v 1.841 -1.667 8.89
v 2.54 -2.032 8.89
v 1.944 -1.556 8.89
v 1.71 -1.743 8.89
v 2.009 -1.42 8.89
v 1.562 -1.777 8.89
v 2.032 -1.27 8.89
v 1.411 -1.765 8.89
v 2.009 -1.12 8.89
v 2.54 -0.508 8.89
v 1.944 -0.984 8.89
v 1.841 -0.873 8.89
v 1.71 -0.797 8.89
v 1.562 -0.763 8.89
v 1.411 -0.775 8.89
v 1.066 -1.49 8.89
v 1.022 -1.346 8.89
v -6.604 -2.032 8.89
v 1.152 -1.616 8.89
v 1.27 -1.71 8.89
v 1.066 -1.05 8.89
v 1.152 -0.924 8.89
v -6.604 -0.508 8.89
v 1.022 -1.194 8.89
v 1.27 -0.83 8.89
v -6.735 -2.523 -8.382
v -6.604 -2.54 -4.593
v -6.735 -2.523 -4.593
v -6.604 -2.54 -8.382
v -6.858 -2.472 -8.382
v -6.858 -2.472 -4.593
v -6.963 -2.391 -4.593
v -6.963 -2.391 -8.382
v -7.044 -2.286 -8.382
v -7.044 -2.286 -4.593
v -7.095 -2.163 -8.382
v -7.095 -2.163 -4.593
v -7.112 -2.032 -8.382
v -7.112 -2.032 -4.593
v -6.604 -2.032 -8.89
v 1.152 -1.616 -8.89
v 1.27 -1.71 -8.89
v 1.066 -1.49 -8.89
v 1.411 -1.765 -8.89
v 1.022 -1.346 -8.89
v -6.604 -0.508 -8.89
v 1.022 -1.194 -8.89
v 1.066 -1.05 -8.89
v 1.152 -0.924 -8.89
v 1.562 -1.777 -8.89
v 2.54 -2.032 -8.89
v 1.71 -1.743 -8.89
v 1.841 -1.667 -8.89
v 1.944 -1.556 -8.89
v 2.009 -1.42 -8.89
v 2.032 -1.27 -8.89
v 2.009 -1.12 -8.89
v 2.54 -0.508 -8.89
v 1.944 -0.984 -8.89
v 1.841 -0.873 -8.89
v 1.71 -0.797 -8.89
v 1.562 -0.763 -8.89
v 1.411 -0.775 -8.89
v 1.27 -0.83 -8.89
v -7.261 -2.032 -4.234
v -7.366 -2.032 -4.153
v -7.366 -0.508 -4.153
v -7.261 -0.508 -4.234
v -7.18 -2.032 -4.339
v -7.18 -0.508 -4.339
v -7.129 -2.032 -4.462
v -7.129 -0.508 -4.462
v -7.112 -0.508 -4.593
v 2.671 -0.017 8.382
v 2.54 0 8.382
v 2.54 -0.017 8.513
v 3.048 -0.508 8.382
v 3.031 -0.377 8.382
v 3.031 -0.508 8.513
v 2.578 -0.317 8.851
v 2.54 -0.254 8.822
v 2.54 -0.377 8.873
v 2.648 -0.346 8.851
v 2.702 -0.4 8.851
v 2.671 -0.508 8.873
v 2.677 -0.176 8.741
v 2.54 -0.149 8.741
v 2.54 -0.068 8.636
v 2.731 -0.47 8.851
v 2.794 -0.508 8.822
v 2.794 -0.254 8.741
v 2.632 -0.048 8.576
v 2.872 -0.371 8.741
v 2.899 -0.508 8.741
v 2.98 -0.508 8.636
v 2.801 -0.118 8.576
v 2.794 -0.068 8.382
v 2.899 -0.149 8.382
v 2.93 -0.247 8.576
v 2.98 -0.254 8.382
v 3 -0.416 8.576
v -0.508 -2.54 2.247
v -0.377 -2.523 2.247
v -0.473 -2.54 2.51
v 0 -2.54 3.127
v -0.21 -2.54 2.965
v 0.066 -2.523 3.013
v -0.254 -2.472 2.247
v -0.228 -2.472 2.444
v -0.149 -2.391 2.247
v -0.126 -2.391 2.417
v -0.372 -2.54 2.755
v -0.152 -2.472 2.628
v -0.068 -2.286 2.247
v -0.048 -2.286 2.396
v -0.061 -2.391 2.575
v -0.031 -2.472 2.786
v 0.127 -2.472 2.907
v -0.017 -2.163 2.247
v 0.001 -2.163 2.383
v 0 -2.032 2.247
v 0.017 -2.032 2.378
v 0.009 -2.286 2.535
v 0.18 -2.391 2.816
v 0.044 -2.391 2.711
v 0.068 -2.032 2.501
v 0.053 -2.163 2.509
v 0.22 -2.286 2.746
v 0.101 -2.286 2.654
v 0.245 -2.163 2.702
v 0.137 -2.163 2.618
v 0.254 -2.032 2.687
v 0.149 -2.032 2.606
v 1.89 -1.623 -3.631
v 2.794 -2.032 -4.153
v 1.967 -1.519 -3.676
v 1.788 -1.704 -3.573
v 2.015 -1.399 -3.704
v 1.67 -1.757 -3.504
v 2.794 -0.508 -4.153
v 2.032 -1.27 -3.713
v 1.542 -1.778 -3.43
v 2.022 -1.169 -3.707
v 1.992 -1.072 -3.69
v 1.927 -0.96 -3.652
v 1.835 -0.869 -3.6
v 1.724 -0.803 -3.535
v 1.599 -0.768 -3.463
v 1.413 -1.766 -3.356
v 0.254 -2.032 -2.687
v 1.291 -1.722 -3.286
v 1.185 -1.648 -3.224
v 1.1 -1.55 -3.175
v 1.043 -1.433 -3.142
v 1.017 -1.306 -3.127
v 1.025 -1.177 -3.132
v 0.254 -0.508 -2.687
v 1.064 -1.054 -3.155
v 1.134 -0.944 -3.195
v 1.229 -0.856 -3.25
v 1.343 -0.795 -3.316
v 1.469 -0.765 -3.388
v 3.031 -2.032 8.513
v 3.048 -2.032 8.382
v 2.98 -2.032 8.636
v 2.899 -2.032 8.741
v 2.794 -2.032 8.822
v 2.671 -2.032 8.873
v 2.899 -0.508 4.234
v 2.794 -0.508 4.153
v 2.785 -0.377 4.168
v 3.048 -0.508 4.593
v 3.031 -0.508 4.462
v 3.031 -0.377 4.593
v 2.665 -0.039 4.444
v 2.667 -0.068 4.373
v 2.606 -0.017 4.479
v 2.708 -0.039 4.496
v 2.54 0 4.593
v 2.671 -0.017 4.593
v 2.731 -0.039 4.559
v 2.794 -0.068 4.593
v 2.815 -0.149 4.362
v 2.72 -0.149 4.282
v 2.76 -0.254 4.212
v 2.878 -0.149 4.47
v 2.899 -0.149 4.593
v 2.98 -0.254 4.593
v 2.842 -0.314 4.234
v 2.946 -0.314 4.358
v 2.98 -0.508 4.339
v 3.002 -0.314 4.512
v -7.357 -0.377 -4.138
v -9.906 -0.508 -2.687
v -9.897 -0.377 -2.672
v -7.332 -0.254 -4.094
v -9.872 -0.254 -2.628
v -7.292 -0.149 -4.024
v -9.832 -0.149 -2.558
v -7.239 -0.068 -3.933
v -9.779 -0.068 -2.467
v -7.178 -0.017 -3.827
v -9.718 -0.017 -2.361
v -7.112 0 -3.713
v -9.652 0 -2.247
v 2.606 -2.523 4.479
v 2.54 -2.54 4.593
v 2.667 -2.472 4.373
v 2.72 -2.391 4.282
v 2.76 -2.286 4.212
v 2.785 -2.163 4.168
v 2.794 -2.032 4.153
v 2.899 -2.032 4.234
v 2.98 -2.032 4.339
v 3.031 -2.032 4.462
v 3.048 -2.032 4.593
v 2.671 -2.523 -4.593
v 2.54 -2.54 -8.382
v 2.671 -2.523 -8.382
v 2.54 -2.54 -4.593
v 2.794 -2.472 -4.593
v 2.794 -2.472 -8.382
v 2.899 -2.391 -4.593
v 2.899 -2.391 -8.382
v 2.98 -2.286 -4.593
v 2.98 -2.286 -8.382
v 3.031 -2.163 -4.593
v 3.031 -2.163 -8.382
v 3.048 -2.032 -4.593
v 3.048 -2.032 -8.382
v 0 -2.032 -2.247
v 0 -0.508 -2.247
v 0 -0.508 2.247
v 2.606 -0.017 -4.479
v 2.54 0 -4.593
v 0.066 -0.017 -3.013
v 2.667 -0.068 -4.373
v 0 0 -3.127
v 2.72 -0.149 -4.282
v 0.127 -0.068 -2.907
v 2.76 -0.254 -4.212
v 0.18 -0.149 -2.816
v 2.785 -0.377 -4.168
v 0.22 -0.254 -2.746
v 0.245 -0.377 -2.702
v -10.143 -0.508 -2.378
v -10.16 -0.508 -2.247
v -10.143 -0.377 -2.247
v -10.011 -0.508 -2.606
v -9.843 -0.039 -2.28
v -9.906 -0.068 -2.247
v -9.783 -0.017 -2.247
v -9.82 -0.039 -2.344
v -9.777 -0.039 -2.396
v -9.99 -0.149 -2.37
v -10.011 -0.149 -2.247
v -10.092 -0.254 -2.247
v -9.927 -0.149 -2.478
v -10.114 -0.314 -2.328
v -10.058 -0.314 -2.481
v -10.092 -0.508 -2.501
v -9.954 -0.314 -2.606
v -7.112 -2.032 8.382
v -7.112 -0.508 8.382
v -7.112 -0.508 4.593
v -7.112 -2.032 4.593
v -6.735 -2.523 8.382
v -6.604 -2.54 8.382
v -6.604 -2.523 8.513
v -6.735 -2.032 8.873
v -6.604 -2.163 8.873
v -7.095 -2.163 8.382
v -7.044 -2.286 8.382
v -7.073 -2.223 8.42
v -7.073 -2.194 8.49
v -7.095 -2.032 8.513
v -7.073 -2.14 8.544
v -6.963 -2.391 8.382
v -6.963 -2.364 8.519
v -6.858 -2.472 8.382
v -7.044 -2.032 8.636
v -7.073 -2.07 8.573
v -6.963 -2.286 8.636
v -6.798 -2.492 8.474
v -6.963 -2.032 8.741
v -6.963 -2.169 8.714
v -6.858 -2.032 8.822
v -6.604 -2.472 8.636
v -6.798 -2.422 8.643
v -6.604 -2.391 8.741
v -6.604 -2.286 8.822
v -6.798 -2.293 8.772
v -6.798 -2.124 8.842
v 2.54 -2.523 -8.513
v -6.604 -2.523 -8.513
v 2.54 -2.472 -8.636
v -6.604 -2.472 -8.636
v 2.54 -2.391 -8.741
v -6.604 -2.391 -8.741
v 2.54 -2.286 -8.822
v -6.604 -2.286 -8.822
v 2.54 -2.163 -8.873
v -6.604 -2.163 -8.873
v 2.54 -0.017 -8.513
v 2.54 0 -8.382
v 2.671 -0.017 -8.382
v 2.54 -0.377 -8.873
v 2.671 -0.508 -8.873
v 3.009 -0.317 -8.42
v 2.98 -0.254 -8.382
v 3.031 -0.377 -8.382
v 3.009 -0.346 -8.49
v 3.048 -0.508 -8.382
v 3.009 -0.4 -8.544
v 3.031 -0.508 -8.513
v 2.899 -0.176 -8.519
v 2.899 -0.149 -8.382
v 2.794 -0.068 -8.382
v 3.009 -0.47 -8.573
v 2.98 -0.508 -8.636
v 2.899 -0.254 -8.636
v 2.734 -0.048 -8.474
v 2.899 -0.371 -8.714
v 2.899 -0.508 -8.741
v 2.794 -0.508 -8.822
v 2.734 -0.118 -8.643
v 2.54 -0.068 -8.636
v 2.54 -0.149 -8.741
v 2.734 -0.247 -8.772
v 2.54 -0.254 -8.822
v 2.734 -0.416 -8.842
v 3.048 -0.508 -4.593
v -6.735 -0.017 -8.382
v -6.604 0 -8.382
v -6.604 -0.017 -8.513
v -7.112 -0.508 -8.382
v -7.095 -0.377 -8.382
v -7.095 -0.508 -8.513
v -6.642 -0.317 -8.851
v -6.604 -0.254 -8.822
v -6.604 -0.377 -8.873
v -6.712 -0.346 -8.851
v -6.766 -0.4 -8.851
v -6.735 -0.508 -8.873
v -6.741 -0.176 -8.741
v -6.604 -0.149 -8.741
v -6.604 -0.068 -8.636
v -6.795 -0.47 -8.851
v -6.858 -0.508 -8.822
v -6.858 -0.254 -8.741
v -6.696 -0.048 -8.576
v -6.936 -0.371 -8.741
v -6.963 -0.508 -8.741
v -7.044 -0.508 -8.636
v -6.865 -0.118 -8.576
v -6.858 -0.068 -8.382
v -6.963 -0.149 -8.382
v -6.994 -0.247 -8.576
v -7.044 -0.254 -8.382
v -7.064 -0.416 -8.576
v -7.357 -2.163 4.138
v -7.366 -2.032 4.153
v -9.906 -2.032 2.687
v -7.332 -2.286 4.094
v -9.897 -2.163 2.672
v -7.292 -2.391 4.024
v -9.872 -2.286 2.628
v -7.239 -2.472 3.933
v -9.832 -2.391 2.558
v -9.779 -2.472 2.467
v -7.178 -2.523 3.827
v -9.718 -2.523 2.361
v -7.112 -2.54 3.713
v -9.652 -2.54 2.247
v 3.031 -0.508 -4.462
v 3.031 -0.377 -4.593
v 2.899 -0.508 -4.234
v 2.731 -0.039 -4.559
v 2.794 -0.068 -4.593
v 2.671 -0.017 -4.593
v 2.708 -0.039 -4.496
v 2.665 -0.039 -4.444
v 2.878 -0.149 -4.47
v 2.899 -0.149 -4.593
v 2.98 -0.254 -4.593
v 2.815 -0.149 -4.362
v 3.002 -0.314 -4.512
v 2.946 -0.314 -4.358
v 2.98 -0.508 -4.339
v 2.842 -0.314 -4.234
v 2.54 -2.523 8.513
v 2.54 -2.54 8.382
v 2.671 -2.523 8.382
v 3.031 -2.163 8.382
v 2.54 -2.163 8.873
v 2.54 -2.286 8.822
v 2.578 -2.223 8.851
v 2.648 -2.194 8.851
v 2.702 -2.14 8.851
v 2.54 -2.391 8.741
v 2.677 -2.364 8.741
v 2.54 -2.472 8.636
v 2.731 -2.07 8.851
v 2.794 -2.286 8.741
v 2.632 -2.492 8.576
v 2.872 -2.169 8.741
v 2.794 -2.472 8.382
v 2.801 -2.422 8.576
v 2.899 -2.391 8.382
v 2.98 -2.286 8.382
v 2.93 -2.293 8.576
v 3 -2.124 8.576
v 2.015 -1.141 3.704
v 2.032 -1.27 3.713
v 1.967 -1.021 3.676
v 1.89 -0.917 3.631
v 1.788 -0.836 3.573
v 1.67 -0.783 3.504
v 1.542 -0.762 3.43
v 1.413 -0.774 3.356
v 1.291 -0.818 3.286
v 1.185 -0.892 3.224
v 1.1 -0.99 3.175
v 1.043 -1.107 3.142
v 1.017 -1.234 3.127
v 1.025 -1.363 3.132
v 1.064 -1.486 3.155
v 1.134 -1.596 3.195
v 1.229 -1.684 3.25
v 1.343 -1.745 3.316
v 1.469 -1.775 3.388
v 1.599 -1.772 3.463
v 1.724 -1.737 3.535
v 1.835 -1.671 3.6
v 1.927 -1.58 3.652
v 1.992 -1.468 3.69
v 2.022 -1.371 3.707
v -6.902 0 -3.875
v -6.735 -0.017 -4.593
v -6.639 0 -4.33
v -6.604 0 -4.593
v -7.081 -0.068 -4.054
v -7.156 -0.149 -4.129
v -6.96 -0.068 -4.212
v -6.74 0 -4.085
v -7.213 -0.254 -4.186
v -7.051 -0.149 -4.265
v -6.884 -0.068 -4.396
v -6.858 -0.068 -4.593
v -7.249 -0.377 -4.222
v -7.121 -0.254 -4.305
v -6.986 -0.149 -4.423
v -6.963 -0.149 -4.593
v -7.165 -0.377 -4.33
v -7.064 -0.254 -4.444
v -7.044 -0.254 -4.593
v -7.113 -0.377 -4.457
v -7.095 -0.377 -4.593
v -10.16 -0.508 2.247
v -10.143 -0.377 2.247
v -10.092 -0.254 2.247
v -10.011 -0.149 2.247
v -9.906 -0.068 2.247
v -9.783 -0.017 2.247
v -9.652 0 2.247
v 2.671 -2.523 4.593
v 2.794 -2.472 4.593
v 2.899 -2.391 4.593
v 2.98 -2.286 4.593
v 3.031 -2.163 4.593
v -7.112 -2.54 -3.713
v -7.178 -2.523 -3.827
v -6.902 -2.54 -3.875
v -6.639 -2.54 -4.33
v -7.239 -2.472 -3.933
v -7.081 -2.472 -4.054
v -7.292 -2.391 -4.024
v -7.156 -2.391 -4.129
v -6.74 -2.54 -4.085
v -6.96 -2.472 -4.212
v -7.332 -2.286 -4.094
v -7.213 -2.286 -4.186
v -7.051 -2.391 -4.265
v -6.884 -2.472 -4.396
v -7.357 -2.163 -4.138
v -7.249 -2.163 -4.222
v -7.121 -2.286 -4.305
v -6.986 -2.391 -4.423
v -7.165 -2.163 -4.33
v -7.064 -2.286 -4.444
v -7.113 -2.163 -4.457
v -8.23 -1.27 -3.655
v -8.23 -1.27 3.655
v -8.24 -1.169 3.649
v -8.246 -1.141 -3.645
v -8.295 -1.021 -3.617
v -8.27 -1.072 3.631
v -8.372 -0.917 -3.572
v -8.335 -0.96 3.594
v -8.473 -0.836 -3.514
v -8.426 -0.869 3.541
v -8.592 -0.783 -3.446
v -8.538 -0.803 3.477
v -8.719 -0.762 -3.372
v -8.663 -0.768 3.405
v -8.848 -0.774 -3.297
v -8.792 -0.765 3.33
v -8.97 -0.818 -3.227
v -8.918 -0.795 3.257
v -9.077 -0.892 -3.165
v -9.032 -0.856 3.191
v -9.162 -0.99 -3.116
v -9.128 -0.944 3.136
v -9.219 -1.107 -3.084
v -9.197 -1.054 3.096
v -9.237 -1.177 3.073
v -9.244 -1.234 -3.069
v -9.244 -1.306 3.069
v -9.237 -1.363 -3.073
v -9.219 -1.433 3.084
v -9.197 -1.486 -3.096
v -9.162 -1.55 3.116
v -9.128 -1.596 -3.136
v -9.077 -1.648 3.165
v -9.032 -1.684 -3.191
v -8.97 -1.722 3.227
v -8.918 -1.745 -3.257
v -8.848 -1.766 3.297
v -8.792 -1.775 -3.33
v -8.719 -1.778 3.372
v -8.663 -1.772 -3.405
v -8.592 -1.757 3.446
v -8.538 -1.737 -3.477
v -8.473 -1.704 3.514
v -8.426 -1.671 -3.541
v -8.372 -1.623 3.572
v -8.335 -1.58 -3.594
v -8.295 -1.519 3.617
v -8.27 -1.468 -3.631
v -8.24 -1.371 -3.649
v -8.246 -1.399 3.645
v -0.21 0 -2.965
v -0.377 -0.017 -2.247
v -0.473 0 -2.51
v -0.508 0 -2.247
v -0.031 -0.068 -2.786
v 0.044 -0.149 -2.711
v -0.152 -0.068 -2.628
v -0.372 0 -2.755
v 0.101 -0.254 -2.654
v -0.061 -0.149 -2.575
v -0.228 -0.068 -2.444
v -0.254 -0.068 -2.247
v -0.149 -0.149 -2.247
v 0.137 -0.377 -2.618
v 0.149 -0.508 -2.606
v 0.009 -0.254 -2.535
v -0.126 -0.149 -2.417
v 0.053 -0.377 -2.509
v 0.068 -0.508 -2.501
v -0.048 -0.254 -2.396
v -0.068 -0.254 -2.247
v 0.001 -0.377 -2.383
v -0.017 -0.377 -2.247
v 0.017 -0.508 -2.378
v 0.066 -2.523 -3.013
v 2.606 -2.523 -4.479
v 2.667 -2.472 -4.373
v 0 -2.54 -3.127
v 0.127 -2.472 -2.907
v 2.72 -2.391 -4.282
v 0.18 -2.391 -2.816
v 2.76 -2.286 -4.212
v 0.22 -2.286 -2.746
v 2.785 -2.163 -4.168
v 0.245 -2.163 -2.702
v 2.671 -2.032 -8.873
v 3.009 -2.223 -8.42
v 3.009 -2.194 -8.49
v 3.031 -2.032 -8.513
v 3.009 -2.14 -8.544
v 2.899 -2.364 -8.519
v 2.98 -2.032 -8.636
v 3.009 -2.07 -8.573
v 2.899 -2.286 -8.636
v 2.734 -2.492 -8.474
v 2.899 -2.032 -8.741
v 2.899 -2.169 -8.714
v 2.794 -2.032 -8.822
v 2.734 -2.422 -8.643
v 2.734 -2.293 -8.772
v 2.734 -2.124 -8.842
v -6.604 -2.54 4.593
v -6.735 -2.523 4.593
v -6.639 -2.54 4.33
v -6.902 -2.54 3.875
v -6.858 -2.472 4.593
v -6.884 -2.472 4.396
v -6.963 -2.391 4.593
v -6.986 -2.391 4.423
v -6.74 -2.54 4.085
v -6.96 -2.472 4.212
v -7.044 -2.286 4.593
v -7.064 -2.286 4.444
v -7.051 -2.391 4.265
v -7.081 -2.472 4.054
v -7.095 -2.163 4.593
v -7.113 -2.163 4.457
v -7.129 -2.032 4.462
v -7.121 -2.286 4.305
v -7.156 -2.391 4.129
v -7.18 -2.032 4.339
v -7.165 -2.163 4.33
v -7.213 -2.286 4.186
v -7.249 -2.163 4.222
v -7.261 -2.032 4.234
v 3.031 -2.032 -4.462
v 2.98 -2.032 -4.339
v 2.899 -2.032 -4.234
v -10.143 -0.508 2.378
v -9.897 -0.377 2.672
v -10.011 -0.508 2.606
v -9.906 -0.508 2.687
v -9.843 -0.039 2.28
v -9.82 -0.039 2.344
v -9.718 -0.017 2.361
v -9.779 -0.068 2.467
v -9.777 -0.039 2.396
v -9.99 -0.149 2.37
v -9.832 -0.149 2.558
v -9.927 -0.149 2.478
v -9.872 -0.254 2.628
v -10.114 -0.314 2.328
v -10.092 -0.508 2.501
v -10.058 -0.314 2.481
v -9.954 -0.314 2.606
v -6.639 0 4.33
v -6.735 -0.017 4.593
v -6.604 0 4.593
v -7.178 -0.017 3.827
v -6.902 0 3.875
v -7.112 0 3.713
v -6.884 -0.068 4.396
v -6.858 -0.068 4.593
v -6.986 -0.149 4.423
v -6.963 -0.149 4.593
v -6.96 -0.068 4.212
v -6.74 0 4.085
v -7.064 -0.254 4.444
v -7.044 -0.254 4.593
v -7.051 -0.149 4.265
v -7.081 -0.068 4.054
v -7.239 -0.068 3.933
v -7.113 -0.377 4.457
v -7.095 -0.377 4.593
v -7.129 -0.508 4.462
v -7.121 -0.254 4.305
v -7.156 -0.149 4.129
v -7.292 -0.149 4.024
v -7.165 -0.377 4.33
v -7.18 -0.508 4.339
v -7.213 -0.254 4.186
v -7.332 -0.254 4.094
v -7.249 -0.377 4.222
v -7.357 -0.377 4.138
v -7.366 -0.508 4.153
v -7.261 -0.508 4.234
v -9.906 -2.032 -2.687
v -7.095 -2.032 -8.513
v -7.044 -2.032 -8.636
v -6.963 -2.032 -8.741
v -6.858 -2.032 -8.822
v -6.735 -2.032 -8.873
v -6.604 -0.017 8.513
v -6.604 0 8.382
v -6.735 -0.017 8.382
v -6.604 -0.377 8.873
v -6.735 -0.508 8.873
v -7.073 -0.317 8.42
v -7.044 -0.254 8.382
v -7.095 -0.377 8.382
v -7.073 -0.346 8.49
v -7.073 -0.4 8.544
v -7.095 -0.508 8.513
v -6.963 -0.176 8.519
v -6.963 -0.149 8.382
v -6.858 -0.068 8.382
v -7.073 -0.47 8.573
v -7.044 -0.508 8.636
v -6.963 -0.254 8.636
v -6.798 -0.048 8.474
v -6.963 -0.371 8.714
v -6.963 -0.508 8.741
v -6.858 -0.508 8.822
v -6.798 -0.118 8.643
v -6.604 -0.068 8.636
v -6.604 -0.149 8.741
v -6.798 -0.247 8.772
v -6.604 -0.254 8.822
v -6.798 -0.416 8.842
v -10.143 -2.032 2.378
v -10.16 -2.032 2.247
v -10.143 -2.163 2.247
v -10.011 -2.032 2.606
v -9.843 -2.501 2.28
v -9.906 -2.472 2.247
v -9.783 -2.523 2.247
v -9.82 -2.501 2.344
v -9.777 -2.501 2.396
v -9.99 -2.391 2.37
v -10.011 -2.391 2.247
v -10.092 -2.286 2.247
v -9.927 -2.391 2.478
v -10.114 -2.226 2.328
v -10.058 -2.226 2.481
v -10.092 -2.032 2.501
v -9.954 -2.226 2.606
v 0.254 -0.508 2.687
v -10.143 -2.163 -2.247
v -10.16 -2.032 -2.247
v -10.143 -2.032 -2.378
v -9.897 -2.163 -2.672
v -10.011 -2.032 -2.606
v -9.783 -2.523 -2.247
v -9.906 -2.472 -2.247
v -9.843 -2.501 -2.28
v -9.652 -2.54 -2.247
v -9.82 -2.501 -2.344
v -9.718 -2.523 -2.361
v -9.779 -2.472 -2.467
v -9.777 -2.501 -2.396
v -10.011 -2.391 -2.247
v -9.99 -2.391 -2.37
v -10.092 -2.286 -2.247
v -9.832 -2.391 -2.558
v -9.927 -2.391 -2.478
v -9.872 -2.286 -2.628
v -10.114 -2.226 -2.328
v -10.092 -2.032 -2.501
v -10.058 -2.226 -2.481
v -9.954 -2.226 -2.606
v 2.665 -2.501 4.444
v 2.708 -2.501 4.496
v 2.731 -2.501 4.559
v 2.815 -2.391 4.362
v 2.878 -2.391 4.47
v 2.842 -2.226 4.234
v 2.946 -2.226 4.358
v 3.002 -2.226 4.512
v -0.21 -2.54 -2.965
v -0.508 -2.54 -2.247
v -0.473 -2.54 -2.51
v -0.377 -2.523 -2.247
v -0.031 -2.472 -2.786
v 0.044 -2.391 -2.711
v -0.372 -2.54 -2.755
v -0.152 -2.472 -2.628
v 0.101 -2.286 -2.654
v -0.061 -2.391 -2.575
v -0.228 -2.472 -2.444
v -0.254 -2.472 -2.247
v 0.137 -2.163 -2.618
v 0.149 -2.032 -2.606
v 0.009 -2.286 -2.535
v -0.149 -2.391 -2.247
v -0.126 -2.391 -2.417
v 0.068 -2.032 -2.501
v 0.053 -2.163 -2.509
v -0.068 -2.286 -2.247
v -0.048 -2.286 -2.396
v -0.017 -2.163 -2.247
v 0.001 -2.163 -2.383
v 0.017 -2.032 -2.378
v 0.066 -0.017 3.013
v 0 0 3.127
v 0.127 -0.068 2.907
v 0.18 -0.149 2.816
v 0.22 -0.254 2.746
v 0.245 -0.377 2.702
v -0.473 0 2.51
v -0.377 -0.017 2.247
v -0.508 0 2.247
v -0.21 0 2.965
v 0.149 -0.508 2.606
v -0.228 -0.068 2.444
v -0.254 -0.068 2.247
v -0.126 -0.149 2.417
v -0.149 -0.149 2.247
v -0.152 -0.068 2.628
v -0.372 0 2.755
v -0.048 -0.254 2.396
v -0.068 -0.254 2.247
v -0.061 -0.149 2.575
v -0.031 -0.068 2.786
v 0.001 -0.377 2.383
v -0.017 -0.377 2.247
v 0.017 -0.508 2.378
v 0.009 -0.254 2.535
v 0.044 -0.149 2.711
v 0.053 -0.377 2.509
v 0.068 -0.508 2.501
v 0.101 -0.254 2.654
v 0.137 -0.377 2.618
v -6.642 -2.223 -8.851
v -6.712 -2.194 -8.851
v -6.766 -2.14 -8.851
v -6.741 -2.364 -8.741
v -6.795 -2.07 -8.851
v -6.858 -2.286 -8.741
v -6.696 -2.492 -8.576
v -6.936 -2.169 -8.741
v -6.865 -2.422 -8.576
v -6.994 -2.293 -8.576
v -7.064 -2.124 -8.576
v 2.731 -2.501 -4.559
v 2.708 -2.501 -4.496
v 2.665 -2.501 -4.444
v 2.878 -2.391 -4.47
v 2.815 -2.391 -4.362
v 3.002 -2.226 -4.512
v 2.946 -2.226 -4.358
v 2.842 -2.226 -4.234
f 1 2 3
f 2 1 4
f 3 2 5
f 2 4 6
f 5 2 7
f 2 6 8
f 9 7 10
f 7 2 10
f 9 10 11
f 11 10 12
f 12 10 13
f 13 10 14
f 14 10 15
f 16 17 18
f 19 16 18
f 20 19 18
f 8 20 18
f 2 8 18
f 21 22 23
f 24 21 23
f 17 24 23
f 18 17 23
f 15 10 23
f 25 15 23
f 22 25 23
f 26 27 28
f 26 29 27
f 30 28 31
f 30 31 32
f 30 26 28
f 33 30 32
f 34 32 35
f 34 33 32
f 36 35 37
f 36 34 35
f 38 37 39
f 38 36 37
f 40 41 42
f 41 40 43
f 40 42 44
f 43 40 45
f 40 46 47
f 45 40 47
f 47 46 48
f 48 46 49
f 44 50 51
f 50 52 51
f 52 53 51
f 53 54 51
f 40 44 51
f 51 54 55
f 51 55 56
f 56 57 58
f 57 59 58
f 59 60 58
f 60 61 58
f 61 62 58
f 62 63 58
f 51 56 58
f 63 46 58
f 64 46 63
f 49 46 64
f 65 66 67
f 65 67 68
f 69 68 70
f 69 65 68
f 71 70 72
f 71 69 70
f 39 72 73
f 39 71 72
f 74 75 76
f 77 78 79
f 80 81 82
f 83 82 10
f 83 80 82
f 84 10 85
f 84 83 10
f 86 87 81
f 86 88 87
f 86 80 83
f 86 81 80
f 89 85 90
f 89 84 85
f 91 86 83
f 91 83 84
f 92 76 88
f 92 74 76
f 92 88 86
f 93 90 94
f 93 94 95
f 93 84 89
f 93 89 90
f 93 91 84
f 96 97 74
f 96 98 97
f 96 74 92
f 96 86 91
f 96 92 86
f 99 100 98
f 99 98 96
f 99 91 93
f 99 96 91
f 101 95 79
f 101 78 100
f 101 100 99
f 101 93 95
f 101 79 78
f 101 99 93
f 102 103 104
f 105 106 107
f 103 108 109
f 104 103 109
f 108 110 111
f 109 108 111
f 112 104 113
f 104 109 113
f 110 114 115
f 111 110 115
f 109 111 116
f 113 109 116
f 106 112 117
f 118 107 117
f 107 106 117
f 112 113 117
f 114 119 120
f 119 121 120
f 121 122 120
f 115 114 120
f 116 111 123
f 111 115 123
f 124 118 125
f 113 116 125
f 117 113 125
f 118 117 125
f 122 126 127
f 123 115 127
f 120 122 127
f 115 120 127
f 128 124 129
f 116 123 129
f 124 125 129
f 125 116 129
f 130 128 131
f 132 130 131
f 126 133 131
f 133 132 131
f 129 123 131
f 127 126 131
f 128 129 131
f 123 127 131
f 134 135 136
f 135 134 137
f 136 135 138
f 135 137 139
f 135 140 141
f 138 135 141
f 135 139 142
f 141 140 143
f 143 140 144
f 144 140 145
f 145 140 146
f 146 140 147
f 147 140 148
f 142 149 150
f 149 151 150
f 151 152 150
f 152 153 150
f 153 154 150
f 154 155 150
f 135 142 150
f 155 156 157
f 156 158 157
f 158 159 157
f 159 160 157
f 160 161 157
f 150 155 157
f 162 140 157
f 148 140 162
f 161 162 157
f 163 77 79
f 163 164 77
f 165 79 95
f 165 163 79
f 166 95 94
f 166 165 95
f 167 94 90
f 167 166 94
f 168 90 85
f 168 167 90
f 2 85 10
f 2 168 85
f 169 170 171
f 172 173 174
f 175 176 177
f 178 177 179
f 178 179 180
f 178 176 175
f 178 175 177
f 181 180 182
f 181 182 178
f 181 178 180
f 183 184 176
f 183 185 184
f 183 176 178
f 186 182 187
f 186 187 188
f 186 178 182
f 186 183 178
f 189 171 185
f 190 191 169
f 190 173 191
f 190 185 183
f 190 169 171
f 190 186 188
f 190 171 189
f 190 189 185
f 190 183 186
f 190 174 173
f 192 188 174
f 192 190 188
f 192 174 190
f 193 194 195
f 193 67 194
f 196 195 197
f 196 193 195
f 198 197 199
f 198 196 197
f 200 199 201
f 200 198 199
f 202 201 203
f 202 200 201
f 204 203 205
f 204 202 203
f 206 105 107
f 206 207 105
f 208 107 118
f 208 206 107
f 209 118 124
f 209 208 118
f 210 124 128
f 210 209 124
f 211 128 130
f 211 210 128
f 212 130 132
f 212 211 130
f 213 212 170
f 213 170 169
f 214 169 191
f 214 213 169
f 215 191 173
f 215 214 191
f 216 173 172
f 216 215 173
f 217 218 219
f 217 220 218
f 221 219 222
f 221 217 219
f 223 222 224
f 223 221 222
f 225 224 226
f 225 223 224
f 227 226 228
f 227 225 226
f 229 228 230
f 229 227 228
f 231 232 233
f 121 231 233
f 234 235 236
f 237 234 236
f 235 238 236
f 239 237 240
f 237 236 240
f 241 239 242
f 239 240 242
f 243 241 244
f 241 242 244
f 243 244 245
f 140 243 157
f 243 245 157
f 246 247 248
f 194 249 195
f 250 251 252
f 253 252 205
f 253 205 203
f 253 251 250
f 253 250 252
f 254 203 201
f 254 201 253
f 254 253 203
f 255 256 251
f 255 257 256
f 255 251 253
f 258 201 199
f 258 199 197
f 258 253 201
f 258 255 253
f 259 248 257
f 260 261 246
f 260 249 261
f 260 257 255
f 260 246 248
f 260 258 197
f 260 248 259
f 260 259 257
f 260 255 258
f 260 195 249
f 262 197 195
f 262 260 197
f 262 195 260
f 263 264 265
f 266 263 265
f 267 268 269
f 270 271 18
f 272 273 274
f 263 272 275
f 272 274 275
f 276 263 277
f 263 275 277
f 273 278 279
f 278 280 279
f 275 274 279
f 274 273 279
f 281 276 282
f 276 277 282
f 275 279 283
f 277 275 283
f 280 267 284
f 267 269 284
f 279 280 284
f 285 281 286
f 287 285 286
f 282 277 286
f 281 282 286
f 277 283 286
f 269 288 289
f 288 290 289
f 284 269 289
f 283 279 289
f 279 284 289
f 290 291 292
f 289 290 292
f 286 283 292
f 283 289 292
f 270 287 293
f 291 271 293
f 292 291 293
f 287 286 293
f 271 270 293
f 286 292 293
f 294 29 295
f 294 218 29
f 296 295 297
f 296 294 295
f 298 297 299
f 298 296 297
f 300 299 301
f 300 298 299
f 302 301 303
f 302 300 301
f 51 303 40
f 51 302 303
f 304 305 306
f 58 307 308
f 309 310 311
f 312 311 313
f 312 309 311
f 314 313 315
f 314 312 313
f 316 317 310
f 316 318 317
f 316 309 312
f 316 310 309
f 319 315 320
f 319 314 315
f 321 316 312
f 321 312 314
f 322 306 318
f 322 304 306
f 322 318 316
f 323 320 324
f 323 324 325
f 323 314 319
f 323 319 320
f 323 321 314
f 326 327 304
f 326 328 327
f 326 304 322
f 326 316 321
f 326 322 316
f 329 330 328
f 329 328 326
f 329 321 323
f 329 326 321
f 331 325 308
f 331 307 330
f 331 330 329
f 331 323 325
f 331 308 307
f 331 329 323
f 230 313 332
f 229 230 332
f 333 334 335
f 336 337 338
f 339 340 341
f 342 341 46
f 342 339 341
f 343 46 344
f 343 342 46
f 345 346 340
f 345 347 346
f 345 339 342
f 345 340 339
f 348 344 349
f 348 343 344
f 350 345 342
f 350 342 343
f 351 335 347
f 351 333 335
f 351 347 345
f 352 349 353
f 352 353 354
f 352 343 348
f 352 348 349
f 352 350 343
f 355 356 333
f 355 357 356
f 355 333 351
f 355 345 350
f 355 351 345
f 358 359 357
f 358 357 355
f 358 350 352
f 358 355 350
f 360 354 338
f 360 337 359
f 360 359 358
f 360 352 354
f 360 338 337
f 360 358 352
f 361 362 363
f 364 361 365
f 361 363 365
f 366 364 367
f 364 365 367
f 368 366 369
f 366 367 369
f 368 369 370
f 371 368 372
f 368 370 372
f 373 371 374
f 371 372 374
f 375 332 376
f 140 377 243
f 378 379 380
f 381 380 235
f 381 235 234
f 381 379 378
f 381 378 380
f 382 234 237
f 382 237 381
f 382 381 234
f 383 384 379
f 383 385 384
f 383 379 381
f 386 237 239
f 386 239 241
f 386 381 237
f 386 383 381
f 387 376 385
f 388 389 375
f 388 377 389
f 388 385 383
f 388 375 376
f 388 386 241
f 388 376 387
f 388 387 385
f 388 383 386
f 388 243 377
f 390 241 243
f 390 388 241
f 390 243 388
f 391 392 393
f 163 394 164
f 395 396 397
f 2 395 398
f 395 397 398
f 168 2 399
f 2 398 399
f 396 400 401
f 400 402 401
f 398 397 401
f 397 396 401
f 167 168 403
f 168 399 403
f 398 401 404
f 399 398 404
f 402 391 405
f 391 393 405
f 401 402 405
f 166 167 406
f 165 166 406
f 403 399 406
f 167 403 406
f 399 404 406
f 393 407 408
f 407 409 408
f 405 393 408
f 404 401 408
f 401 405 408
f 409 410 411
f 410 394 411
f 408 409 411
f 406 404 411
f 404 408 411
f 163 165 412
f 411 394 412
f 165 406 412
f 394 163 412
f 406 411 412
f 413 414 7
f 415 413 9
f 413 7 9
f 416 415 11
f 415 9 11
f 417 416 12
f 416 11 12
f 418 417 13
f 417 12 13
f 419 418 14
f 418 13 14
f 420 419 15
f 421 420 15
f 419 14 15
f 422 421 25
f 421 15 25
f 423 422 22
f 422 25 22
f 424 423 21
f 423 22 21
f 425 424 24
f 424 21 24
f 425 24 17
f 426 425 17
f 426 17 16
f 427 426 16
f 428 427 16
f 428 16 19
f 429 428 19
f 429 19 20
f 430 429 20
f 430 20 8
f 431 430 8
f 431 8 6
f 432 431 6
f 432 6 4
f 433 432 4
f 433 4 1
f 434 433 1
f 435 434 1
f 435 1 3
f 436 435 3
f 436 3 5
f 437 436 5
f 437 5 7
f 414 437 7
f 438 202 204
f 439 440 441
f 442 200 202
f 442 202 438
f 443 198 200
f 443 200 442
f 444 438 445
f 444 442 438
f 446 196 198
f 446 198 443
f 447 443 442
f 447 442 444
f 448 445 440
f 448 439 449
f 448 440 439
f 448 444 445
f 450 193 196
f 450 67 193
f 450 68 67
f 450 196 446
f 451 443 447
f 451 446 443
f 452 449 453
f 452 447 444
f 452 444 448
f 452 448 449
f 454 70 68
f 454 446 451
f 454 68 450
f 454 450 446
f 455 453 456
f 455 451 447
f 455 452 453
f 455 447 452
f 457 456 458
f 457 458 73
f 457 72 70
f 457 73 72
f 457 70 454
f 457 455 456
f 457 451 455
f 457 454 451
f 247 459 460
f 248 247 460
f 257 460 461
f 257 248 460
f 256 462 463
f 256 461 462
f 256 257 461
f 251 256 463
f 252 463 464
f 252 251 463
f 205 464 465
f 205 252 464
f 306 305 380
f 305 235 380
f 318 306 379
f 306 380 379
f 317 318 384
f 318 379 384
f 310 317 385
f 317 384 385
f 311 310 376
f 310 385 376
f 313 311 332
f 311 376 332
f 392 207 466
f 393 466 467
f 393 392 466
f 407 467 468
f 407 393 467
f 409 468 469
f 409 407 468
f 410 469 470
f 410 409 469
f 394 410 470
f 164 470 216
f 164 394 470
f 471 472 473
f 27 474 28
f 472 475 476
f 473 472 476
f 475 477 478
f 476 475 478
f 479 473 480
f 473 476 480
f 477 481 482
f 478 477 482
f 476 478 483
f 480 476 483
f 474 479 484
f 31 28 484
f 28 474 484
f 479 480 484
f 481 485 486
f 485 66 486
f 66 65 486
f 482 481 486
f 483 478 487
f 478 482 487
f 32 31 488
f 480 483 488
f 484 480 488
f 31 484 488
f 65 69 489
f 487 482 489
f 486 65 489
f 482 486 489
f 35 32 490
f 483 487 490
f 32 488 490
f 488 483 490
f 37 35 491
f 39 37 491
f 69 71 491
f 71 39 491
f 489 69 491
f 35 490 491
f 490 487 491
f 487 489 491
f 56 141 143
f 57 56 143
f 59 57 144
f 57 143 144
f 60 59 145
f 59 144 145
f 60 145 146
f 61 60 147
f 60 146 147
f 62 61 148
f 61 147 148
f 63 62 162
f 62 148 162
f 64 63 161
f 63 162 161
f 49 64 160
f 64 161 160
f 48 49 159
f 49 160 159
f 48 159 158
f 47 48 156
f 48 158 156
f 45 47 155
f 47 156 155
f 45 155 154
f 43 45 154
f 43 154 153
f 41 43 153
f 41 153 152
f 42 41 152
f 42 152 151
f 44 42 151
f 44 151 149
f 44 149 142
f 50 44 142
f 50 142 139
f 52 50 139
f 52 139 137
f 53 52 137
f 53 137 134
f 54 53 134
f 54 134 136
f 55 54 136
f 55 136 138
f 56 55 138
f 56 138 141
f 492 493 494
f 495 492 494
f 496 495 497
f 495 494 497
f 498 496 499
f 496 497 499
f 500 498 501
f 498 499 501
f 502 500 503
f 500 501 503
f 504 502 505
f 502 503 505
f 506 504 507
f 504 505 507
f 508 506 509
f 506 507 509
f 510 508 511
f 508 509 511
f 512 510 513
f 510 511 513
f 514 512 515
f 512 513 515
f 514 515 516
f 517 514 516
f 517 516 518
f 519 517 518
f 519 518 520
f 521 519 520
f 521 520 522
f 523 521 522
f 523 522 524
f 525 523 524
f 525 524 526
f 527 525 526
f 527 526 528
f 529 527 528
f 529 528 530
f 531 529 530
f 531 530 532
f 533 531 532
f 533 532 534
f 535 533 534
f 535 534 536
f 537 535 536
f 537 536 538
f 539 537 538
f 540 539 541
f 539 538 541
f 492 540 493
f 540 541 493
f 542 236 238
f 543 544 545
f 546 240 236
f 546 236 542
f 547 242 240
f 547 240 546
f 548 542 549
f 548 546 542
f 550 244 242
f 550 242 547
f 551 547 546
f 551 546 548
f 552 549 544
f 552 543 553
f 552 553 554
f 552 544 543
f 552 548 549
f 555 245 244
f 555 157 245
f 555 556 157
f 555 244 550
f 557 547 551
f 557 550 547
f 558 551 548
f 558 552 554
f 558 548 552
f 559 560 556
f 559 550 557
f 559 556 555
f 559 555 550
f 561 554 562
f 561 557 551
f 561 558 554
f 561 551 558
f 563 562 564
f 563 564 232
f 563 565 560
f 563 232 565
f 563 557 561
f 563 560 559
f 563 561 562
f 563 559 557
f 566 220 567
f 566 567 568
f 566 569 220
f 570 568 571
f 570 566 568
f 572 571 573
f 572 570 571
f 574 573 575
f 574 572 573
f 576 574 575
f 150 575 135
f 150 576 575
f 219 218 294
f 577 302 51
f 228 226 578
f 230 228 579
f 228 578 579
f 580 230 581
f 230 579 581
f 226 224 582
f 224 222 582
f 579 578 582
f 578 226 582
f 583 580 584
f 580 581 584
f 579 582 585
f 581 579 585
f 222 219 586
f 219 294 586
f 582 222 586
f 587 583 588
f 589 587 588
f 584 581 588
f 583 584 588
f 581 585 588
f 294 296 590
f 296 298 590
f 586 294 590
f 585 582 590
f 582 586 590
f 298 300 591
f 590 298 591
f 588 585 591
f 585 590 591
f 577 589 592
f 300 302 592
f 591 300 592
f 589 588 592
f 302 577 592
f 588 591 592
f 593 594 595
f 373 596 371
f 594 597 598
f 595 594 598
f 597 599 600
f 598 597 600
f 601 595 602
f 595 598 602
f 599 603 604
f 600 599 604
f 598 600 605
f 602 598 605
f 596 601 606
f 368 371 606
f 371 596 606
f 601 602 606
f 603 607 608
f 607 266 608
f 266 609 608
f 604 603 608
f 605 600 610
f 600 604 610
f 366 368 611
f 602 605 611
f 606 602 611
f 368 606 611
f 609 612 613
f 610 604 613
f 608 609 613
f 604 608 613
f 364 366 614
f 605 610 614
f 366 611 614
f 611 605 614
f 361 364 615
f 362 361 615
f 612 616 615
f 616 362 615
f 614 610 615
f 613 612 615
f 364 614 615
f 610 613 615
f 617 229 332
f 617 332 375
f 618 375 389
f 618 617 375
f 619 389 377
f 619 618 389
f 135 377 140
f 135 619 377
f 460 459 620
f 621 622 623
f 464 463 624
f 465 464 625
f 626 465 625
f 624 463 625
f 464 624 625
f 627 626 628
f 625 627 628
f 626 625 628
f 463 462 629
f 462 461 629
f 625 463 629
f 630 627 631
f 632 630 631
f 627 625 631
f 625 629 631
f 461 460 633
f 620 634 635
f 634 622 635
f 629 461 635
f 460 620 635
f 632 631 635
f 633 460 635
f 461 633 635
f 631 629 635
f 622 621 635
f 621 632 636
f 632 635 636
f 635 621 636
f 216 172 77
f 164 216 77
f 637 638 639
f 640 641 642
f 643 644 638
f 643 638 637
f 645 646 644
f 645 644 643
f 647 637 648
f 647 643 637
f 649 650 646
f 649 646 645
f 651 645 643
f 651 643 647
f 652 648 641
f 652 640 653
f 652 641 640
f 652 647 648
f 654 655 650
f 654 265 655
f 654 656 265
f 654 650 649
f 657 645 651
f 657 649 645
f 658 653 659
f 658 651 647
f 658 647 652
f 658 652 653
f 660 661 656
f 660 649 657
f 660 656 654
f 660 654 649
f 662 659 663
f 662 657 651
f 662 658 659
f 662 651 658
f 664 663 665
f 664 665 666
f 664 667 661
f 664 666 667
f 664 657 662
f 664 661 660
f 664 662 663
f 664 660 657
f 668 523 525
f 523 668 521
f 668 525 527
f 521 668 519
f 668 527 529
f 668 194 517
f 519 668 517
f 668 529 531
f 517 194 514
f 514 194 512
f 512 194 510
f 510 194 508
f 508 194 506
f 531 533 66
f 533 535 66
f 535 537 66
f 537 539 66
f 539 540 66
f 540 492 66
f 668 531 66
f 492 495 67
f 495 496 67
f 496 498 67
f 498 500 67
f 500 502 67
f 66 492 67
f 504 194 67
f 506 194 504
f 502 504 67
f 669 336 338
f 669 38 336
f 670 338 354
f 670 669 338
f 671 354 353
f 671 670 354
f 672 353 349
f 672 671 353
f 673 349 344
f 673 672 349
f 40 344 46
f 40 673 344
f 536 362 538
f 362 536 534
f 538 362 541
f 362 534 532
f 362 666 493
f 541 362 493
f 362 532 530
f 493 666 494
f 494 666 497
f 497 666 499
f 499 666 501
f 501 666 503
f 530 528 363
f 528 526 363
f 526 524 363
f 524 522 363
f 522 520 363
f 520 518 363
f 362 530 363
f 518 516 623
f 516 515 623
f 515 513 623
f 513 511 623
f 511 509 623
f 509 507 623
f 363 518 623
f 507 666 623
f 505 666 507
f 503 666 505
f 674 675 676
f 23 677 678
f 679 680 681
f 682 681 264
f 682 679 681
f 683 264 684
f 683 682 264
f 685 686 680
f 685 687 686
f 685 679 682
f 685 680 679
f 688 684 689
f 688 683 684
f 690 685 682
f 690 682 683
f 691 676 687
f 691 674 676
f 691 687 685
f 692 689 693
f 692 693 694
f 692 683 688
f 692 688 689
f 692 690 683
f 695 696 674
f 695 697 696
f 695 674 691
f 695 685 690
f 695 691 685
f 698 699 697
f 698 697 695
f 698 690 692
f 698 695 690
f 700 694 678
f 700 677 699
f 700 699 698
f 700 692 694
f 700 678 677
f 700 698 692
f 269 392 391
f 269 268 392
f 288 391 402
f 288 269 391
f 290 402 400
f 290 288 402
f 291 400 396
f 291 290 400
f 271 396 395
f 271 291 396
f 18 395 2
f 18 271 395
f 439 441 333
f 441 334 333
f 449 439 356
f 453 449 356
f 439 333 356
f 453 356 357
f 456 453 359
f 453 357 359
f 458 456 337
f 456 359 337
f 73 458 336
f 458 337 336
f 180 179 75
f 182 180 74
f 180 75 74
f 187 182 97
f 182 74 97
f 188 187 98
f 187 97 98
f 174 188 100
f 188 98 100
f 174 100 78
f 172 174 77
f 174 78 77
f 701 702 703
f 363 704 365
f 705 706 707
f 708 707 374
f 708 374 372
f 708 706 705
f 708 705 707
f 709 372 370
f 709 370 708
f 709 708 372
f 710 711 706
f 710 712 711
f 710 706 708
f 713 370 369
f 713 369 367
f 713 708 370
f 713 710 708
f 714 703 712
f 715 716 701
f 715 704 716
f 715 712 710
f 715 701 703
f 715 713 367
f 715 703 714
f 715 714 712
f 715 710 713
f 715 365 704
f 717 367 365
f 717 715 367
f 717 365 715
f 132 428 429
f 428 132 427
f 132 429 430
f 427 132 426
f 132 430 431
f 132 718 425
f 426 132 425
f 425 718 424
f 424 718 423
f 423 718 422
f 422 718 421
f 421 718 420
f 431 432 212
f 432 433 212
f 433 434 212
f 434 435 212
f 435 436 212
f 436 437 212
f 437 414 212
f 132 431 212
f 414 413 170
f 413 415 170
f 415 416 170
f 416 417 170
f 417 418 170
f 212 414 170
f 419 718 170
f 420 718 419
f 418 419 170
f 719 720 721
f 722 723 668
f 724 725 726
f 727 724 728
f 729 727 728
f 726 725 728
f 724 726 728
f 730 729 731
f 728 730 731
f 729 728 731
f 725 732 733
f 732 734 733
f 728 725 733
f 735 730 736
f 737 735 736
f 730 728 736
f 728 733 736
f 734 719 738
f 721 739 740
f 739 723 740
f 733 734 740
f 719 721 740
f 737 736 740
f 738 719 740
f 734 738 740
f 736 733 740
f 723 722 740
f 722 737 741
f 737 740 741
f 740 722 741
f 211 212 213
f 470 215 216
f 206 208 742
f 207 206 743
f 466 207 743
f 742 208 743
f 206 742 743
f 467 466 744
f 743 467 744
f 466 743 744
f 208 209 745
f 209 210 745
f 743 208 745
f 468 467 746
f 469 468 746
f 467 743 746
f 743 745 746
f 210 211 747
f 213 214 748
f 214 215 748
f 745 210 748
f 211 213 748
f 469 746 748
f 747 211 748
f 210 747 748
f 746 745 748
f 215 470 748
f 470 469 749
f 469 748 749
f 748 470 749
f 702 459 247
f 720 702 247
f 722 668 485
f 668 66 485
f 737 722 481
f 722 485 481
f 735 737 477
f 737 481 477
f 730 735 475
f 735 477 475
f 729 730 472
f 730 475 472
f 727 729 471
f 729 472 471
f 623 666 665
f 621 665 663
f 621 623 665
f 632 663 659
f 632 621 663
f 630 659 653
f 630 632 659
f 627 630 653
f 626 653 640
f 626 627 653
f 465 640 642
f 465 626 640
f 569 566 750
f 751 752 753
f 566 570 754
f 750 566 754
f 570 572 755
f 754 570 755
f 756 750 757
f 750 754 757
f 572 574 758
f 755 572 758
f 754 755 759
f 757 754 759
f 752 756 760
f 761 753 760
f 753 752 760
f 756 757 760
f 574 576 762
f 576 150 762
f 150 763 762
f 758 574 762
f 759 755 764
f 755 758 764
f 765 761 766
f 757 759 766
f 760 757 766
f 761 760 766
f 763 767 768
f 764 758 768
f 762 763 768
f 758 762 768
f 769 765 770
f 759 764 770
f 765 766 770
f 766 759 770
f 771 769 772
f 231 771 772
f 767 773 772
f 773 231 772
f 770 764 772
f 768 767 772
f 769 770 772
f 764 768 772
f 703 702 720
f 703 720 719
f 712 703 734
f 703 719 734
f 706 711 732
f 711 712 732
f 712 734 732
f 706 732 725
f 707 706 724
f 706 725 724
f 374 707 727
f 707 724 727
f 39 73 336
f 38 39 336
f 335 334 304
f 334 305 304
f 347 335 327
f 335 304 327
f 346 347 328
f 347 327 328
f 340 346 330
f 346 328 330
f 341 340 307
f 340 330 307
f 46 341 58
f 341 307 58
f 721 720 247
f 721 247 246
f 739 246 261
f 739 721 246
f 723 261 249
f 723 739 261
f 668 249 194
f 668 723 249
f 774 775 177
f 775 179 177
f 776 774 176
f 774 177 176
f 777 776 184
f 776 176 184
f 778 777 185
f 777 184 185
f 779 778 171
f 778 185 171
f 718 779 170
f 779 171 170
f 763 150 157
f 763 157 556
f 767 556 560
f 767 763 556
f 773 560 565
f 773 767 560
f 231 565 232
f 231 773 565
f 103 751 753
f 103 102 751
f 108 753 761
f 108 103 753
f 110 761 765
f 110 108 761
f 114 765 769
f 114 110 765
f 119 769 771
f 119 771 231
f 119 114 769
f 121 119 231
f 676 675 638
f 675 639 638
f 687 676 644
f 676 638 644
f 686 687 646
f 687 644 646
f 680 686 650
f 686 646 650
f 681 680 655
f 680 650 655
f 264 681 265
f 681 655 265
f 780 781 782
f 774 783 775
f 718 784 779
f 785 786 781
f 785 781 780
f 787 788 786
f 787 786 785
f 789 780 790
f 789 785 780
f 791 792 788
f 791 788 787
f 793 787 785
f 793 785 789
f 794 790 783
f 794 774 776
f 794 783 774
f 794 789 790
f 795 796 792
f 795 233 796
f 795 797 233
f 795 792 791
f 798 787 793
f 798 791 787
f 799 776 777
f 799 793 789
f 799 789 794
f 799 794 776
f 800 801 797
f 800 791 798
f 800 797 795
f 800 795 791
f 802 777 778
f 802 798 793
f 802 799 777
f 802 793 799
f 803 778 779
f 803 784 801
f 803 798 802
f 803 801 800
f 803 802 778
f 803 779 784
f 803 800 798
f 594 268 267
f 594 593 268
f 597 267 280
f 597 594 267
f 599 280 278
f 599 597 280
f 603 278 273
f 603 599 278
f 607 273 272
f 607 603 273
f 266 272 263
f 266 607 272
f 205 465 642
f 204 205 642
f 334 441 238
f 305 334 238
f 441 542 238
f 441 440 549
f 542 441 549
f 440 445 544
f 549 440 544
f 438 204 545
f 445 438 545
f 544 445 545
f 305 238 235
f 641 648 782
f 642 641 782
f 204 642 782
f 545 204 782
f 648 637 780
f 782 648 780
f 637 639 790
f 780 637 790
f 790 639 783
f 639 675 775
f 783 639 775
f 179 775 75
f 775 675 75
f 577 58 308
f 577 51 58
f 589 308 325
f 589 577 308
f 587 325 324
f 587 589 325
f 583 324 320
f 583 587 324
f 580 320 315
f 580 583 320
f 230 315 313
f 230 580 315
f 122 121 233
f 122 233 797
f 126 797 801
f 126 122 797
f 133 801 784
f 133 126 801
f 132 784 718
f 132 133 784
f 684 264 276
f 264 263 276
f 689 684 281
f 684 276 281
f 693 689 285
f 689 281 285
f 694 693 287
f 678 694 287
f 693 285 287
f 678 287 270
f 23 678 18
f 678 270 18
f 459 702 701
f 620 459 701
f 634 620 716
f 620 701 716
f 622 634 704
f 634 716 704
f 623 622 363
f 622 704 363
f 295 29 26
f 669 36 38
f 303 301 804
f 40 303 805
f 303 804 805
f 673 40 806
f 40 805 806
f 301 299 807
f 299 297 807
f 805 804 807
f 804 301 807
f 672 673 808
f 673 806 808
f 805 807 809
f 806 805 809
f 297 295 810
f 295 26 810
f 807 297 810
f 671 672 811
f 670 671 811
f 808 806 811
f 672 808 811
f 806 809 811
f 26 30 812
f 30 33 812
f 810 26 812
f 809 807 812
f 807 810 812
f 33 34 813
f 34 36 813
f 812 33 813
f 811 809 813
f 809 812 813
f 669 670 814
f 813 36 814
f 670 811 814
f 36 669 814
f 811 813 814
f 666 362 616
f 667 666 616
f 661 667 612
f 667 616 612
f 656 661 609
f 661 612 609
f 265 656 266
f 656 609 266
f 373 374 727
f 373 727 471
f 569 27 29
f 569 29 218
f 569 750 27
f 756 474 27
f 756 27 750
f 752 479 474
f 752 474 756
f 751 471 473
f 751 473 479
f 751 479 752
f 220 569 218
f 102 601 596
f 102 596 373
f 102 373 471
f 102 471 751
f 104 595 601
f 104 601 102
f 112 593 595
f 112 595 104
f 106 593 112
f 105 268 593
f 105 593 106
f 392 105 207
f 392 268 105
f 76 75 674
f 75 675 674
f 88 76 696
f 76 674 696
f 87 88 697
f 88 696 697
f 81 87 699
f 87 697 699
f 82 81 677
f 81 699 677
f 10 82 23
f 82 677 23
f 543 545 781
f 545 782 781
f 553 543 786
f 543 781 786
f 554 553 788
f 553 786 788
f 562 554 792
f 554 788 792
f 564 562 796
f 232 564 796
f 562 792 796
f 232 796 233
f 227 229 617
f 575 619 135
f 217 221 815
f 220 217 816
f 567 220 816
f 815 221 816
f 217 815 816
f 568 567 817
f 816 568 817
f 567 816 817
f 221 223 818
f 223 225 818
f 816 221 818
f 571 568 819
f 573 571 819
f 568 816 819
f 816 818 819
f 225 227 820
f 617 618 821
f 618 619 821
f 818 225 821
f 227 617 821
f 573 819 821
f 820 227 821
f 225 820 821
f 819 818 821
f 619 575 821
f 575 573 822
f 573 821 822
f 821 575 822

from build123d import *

# Parameters (mm, degrees)
F1_DEPTH = 2.54
F2_R     = 0.508
F3_DEPTH = 25.4
F4_R     = 0.508


with BuildPart() as f1:
    # F0 (on Front) → F1 (new body)
    with BuildSketch(Plane.XZ):
        Polygon((-10.16, 2.54), (-10.16, 0), (-10.16, -2.54), (-7.112, -4.299764), (-7.112, -8.89), (3.048, -8.89), (3.048, -4.299764), (0, -2.54), (0, 0), (0, 2.54), (3.048, 4.299764), (3.048, 8.89), (-7.112, 8.89), (-7.112, 4.299764), align=None)
    extrude(amount=F1_DEPTH)

    # F2 (on face) → F3 (cut)
    with BuildSketch(Plane.XY.offset(8.89)):
        with Locations((1.524, -1.27)):
            Circle(F2_R)
        with Locations((-8.7376, -1.27)):
            Circle(F2_R)
    extrude(amount=-F3_DEPTH, mode=Mode.SUBTRACT)

    # F4
    f4_edges = [f1.edges().sort_by_distance(p)[0] for p in [
        (-10.16, 0, 0),
        (-8.636, 0, -3.419882),
        (-7.112, 0, -6.594882),
        (-2.032, 0, -8.89),
        (3.048, 0, -6.594882),
        (1.524, 0, -3.419882),
        (0, 0, 0),
        (1.524, 0, 3.419882),
        (3.048, 0, 6.594882),
        (-2.032, 0, 8.89),
        (-7.112, 0, 6.594882),
        (-8.636, 0, 3.419882),
        (-10.16, -2.54, 0),
        (-8.636, -2.54, -3.419882),
        (-7.112, -2.54, -6.594882),
        (-2.032, -2.54, -8.89),
        (3.048, -2.54, -6.594882),
        (1.524, -2.54, -3.419882),
        (0, -2.54, 0),
        (1.524, -2.54, 3.419882),
        (3.048, -2.54, 6.594882),
        (-2.032, -2.54, 8.89),
        (-7.112, -2.54, 6.594882),
        (-8.636, -2.54, 3.419882),
        (3.048, -1.27, -8.89),
        (-7.112, -1.27, 8.89),
        (-7.112, -1.27, 4.299764),
        (-10.16, -1.27, 2.54),
        (3.048, -1.27, 8.89),
        (3.048, -1.27, -4.299764),
        (3.048, -1.27, 4.299764),
        (0, -1.27, 2.54),
        (0, -1.27, -2.54),
        (-7.112, -1.27, -8.89),
        (-7.112, -1.27, -4.299764),
        (-10.16, -1.27, -2.54),
    ]]
    fillet(f4_edges, radius=F4_R)


solid = f1.part
